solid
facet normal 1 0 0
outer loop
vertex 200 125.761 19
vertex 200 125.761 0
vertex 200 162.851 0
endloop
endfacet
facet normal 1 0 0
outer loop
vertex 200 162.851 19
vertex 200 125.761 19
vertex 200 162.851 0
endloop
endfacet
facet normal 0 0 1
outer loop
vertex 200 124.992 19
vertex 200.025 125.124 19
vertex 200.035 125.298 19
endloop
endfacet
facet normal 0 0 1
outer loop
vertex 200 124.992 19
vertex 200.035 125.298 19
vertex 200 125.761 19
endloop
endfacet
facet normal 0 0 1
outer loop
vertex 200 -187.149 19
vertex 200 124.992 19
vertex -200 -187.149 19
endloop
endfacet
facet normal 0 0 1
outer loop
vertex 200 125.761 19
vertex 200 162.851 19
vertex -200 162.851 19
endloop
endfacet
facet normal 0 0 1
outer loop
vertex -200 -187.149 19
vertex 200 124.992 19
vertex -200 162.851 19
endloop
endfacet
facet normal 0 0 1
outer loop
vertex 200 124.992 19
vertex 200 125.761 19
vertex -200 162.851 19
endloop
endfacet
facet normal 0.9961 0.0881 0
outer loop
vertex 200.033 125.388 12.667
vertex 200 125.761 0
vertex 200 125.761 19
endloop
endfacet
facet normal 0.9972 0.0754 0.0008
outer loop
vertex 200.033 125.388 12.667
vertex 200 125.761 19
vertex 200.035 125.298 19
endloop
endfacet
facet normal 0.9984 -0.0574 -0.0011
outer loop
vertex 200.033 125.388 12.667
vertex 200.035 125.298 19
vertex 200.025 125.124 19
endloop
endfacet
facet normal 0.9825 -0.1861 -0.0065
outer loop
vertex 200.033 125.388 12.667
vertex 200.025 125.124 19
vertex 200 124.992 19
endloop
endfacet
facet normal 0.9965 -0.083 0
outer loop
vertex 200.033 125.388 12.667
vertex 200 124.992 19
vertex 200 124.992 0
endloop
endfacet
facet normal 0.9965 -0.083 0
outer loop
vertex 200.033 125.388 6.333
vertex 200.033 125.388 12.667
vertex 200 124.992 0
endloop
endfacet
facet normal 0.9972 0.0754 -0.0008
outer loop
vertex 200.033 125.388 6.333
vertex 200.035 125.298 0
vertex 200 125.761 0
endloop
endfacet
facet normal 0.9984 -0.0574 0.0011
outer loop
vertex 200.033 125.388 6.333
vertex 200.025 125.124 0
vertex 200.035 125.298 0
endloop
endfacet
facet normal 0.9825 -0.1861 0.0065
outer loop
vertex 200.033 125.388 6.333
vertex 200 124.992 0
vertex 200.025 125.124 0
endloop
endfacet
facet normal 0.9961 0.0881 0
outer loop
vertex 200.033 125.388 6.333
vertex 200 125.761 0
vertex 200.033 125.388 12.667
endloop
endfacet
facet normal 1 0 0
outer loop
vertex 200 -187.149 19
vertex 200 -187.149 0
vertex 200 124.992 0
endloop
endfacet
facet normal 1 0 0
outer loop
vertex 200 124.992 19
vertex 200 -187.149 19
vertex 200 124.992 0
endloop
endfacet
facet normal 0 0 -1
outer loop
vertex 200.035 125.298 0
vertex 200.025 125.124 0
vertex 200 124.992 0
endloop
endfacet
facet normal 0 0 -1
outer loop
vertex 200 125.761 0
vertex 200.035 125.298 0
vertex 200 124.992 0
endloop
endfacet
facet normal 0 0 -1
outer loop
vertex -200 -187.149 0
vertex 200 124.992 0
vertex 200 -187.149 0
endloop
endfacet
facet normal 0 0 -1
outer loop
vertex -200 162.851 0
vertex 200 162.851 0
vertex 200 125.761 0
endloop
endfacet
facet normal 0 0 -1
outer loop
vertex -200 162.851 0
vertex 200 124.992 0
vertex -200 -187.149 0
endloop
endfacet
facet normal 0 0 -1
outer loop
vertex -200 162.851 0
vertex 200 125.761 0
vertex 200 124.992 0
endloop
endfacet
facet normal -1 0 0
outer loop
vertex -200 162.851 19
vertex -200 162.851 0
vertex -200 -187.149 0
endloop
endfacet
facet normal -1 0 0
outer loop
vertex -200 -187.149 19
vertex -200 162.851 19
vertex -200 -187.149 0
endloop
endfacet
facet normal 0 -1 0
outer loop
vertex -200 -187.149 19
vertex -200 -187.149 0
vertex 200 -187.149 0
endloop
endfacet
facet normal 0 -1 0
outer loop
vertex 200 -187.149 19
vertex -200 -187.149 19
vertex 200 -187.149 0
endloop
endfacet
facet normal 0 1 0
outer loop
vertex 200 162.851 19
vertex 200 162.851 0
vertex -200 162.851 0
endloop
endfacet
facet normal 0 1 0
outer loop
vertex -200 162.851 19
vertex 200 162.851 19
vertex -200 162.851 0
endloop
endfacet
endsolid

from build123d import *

# Parameters (mm, degrees)
F1_DEPTH = 19
F2_DEPTH = 548
F3_DEPTH = 548


# Not quite as in the source:
# - an extrude ends at something that could not be found from the text; its depth is read off the source's solid


with BuildPart() as f1:
    # F0 (on Top) → F1 (new body)
    with BuildSketch(Plane.XY):
        with BuildLine():
            add(Edge.make_bspline(
                [(-200, -132.6209452411), (-200, -154.8058367287), (-187.1411707237, -172.3375741418), (-168.017625666, -187.1492117643), (-133.0151869916, -187.1492117643)],
                knots=[0, 0, 0, 0, 0.4562793143, 1, 1, 1, 1], degree=3))
            Line((-200, -132.6209452411), (-200, -187.1492117643))
            Line((-200, -187.1492117643), (-133.0151869916, -187.1492117643))
        make_face()
        with BuildLine():
            Line((200, -187.1492117643), (200, -133.3316862583))
            add(Edge.make_bspline(
                [(200, -133.3316862583), (196.8726040376, -145.854416396), (194.7195639705, -177.063078406), (166.3433221251, -183.7126432901), (157.4708074331, -187.1492117643)],
                knots=[0, 0, 0, 0, 0.5227747717, 1, 1, 1, 1], degree=3))
            Line((157.4708074331, -187.1492117643), (200, -187.1492117643))
        make_face()
        with BuildLine():
            add(Edge.make_bspline(
                [(200, 125.7612258196), (200.0567834577, 125.2951155246), (200.0345329904, 125.1404634173), (200, 124.9924004078)],
                knots=[0.9249687191, 0.9249687191, 0.9249687191, 0.9249687191, 1, 1, 1, 1], degree=3))
            Line((200, 125.7612258196), (200, 124.9924004078))
        make_face()
        with BuildLine():
            add(Edge.make_bspline(
                [(159.7772687674, 162.8507882357), (169.0774328446, 160.2876502356), (193.3291623418, 156.440564551), (199.6711808851, 128.4603565342), (200, 125.7612258196)],
                knots=[0, 0, 0, 0, 0.4904809229, 0.9249687191, 0.9249687191, 0.9249687191, 0.9249687191], degree=3))
            Line((159.7772687674, 162.8507882357), (-153.6801122603, 162.8507882357))
            add(Edge.make_bspline(
                [(-200, 104.9124646716), (-200, 131.7387589341), (-185.8746875729, 148.9797410683), (-171.5849838132, 162.8507882357), (-153.6801122603, 162.8507882357)],
                knots=[0, 0, 0, 0, 0.5414752597, 1, 1, 1, 1], degree=3))
            Line((-200, 104.9124646716), (-200, -132.6209452411))
            add(Edge.make_bspline(
                [(-200, -132.6209452411), (-200, -154.8058367287), (-187.1411707237, -172.3375741418), (-168.017625666, -187.1492117643), (-133.0151869916, -187.1492117643)],
                knots=[0, 0, 0, 0, 0.4562793143, 1, 1, 1, 1], degree=3))
            Line((-133.0151869916, -187.1492117643), (157.4708074331, -187.1492117643))
            add(Edge.make_bspline(
                [(200, -133.3316862583), (196.8726040376, -145.854416396), (194.7195639705, -177.063078406), (166.3433221251, -183.7126432901), (157.4708074331, -187.1492117643)],
                knots=[0, 0, 0, 0, 0.5227747717, 1, 1, 1, 1], degree=3))
            Line((200, -133.3316862583), (200, 124.9924004078))
            Line((200, 124.9924004078), (200, 125.7612258196))
        make_face()
        with BuildLine():
            add(Edge.make_bspline(
                [(-200, 104.9124646716), (-200, 131.7387589341), (-185.8746875729, 148.9797410683), (-171.5849838132, 162.8507882357), (-153.6801122603, 162.8507882357)],
                knots=[0, 0, 0, 0, 0.5414752597, 1, 1, 1, 1], degree=3))
            Line((-153.6801122603, 162.8507882357), (-200, 162.8507882357))
            Line((-200, 162.8507882357), (-200, 104.9124646716))
        make_face()
        with BuildLine():
            Line((200, 125.7612258196), (200, 162.8507882357))
            Line((200, 162.8507882357), (159.7772687674, 162.8507882357))
            add(Edge.make_bspline(
                [(159.7772687674, 162.8507882357), (169.0774328446, 160.2876502356), (193.3291623418, 156.440564551), (199.6711808851, 128.4603565342), (200, 125.7612258196)],
                knots=[0, 0, 0, 0, 0.4904809229, 0.9249687191, 0.9249687191, 0.9249687191, 0.9249687191], degree=3))
        make_face()
    extrude(amount=F1_DEPTH)

    # F0 (on Top) → F2 (cut, through all)
    with BuildSketch(Plane.XY):
        with BuildLine():
            add(Edge.make_bspline(
                [(-200, -132.6209452411), (-200, -154.8058367287), (-187.1411707237, -172.3375741418), (-168.017625666, -187.1492117643), (-133.0151869916, -187.1492117643)],
                knots=[0, 0, 0, 0, 0.4562793143, 1, 1, 1, 1], degree=3))
            Line((-200, -132.6209452411), (-200, -187.1492117643))
            Line((-200, -187.1492117643), (-133.0151869916, -187.1492117643))
        make_face()
    extrude(amount=-F2_DEPTH, mode=Mode.SUBTRACT)

    # F0 (on Top) → F3 (cut, through all)
    with BuildSketch(Plane.XY):
        with BuildLine():
            add(Edge.make_bspline(
                [(-200, 104.9124646716), (-200, 131.7387589341), (-185.8746875729, 148.9797410683), (-171.5849838132, 162.8507882357), (-153.6801122603, 162.8507882357)],
                knots=[0, 0, 0, 0, 0.5414752597, 1, 1, 1, 1], degree=3))
            Line((-153.6801122603, 162.8507882357), (-200, 162.8507882357))
            Line((-200, 162.8507882357), (-200, 104.9124646716))
        make_face()
    extrude(amount=-F3_DEPTH, mode=Mode.SUBTRACT)


solid = f1.part
